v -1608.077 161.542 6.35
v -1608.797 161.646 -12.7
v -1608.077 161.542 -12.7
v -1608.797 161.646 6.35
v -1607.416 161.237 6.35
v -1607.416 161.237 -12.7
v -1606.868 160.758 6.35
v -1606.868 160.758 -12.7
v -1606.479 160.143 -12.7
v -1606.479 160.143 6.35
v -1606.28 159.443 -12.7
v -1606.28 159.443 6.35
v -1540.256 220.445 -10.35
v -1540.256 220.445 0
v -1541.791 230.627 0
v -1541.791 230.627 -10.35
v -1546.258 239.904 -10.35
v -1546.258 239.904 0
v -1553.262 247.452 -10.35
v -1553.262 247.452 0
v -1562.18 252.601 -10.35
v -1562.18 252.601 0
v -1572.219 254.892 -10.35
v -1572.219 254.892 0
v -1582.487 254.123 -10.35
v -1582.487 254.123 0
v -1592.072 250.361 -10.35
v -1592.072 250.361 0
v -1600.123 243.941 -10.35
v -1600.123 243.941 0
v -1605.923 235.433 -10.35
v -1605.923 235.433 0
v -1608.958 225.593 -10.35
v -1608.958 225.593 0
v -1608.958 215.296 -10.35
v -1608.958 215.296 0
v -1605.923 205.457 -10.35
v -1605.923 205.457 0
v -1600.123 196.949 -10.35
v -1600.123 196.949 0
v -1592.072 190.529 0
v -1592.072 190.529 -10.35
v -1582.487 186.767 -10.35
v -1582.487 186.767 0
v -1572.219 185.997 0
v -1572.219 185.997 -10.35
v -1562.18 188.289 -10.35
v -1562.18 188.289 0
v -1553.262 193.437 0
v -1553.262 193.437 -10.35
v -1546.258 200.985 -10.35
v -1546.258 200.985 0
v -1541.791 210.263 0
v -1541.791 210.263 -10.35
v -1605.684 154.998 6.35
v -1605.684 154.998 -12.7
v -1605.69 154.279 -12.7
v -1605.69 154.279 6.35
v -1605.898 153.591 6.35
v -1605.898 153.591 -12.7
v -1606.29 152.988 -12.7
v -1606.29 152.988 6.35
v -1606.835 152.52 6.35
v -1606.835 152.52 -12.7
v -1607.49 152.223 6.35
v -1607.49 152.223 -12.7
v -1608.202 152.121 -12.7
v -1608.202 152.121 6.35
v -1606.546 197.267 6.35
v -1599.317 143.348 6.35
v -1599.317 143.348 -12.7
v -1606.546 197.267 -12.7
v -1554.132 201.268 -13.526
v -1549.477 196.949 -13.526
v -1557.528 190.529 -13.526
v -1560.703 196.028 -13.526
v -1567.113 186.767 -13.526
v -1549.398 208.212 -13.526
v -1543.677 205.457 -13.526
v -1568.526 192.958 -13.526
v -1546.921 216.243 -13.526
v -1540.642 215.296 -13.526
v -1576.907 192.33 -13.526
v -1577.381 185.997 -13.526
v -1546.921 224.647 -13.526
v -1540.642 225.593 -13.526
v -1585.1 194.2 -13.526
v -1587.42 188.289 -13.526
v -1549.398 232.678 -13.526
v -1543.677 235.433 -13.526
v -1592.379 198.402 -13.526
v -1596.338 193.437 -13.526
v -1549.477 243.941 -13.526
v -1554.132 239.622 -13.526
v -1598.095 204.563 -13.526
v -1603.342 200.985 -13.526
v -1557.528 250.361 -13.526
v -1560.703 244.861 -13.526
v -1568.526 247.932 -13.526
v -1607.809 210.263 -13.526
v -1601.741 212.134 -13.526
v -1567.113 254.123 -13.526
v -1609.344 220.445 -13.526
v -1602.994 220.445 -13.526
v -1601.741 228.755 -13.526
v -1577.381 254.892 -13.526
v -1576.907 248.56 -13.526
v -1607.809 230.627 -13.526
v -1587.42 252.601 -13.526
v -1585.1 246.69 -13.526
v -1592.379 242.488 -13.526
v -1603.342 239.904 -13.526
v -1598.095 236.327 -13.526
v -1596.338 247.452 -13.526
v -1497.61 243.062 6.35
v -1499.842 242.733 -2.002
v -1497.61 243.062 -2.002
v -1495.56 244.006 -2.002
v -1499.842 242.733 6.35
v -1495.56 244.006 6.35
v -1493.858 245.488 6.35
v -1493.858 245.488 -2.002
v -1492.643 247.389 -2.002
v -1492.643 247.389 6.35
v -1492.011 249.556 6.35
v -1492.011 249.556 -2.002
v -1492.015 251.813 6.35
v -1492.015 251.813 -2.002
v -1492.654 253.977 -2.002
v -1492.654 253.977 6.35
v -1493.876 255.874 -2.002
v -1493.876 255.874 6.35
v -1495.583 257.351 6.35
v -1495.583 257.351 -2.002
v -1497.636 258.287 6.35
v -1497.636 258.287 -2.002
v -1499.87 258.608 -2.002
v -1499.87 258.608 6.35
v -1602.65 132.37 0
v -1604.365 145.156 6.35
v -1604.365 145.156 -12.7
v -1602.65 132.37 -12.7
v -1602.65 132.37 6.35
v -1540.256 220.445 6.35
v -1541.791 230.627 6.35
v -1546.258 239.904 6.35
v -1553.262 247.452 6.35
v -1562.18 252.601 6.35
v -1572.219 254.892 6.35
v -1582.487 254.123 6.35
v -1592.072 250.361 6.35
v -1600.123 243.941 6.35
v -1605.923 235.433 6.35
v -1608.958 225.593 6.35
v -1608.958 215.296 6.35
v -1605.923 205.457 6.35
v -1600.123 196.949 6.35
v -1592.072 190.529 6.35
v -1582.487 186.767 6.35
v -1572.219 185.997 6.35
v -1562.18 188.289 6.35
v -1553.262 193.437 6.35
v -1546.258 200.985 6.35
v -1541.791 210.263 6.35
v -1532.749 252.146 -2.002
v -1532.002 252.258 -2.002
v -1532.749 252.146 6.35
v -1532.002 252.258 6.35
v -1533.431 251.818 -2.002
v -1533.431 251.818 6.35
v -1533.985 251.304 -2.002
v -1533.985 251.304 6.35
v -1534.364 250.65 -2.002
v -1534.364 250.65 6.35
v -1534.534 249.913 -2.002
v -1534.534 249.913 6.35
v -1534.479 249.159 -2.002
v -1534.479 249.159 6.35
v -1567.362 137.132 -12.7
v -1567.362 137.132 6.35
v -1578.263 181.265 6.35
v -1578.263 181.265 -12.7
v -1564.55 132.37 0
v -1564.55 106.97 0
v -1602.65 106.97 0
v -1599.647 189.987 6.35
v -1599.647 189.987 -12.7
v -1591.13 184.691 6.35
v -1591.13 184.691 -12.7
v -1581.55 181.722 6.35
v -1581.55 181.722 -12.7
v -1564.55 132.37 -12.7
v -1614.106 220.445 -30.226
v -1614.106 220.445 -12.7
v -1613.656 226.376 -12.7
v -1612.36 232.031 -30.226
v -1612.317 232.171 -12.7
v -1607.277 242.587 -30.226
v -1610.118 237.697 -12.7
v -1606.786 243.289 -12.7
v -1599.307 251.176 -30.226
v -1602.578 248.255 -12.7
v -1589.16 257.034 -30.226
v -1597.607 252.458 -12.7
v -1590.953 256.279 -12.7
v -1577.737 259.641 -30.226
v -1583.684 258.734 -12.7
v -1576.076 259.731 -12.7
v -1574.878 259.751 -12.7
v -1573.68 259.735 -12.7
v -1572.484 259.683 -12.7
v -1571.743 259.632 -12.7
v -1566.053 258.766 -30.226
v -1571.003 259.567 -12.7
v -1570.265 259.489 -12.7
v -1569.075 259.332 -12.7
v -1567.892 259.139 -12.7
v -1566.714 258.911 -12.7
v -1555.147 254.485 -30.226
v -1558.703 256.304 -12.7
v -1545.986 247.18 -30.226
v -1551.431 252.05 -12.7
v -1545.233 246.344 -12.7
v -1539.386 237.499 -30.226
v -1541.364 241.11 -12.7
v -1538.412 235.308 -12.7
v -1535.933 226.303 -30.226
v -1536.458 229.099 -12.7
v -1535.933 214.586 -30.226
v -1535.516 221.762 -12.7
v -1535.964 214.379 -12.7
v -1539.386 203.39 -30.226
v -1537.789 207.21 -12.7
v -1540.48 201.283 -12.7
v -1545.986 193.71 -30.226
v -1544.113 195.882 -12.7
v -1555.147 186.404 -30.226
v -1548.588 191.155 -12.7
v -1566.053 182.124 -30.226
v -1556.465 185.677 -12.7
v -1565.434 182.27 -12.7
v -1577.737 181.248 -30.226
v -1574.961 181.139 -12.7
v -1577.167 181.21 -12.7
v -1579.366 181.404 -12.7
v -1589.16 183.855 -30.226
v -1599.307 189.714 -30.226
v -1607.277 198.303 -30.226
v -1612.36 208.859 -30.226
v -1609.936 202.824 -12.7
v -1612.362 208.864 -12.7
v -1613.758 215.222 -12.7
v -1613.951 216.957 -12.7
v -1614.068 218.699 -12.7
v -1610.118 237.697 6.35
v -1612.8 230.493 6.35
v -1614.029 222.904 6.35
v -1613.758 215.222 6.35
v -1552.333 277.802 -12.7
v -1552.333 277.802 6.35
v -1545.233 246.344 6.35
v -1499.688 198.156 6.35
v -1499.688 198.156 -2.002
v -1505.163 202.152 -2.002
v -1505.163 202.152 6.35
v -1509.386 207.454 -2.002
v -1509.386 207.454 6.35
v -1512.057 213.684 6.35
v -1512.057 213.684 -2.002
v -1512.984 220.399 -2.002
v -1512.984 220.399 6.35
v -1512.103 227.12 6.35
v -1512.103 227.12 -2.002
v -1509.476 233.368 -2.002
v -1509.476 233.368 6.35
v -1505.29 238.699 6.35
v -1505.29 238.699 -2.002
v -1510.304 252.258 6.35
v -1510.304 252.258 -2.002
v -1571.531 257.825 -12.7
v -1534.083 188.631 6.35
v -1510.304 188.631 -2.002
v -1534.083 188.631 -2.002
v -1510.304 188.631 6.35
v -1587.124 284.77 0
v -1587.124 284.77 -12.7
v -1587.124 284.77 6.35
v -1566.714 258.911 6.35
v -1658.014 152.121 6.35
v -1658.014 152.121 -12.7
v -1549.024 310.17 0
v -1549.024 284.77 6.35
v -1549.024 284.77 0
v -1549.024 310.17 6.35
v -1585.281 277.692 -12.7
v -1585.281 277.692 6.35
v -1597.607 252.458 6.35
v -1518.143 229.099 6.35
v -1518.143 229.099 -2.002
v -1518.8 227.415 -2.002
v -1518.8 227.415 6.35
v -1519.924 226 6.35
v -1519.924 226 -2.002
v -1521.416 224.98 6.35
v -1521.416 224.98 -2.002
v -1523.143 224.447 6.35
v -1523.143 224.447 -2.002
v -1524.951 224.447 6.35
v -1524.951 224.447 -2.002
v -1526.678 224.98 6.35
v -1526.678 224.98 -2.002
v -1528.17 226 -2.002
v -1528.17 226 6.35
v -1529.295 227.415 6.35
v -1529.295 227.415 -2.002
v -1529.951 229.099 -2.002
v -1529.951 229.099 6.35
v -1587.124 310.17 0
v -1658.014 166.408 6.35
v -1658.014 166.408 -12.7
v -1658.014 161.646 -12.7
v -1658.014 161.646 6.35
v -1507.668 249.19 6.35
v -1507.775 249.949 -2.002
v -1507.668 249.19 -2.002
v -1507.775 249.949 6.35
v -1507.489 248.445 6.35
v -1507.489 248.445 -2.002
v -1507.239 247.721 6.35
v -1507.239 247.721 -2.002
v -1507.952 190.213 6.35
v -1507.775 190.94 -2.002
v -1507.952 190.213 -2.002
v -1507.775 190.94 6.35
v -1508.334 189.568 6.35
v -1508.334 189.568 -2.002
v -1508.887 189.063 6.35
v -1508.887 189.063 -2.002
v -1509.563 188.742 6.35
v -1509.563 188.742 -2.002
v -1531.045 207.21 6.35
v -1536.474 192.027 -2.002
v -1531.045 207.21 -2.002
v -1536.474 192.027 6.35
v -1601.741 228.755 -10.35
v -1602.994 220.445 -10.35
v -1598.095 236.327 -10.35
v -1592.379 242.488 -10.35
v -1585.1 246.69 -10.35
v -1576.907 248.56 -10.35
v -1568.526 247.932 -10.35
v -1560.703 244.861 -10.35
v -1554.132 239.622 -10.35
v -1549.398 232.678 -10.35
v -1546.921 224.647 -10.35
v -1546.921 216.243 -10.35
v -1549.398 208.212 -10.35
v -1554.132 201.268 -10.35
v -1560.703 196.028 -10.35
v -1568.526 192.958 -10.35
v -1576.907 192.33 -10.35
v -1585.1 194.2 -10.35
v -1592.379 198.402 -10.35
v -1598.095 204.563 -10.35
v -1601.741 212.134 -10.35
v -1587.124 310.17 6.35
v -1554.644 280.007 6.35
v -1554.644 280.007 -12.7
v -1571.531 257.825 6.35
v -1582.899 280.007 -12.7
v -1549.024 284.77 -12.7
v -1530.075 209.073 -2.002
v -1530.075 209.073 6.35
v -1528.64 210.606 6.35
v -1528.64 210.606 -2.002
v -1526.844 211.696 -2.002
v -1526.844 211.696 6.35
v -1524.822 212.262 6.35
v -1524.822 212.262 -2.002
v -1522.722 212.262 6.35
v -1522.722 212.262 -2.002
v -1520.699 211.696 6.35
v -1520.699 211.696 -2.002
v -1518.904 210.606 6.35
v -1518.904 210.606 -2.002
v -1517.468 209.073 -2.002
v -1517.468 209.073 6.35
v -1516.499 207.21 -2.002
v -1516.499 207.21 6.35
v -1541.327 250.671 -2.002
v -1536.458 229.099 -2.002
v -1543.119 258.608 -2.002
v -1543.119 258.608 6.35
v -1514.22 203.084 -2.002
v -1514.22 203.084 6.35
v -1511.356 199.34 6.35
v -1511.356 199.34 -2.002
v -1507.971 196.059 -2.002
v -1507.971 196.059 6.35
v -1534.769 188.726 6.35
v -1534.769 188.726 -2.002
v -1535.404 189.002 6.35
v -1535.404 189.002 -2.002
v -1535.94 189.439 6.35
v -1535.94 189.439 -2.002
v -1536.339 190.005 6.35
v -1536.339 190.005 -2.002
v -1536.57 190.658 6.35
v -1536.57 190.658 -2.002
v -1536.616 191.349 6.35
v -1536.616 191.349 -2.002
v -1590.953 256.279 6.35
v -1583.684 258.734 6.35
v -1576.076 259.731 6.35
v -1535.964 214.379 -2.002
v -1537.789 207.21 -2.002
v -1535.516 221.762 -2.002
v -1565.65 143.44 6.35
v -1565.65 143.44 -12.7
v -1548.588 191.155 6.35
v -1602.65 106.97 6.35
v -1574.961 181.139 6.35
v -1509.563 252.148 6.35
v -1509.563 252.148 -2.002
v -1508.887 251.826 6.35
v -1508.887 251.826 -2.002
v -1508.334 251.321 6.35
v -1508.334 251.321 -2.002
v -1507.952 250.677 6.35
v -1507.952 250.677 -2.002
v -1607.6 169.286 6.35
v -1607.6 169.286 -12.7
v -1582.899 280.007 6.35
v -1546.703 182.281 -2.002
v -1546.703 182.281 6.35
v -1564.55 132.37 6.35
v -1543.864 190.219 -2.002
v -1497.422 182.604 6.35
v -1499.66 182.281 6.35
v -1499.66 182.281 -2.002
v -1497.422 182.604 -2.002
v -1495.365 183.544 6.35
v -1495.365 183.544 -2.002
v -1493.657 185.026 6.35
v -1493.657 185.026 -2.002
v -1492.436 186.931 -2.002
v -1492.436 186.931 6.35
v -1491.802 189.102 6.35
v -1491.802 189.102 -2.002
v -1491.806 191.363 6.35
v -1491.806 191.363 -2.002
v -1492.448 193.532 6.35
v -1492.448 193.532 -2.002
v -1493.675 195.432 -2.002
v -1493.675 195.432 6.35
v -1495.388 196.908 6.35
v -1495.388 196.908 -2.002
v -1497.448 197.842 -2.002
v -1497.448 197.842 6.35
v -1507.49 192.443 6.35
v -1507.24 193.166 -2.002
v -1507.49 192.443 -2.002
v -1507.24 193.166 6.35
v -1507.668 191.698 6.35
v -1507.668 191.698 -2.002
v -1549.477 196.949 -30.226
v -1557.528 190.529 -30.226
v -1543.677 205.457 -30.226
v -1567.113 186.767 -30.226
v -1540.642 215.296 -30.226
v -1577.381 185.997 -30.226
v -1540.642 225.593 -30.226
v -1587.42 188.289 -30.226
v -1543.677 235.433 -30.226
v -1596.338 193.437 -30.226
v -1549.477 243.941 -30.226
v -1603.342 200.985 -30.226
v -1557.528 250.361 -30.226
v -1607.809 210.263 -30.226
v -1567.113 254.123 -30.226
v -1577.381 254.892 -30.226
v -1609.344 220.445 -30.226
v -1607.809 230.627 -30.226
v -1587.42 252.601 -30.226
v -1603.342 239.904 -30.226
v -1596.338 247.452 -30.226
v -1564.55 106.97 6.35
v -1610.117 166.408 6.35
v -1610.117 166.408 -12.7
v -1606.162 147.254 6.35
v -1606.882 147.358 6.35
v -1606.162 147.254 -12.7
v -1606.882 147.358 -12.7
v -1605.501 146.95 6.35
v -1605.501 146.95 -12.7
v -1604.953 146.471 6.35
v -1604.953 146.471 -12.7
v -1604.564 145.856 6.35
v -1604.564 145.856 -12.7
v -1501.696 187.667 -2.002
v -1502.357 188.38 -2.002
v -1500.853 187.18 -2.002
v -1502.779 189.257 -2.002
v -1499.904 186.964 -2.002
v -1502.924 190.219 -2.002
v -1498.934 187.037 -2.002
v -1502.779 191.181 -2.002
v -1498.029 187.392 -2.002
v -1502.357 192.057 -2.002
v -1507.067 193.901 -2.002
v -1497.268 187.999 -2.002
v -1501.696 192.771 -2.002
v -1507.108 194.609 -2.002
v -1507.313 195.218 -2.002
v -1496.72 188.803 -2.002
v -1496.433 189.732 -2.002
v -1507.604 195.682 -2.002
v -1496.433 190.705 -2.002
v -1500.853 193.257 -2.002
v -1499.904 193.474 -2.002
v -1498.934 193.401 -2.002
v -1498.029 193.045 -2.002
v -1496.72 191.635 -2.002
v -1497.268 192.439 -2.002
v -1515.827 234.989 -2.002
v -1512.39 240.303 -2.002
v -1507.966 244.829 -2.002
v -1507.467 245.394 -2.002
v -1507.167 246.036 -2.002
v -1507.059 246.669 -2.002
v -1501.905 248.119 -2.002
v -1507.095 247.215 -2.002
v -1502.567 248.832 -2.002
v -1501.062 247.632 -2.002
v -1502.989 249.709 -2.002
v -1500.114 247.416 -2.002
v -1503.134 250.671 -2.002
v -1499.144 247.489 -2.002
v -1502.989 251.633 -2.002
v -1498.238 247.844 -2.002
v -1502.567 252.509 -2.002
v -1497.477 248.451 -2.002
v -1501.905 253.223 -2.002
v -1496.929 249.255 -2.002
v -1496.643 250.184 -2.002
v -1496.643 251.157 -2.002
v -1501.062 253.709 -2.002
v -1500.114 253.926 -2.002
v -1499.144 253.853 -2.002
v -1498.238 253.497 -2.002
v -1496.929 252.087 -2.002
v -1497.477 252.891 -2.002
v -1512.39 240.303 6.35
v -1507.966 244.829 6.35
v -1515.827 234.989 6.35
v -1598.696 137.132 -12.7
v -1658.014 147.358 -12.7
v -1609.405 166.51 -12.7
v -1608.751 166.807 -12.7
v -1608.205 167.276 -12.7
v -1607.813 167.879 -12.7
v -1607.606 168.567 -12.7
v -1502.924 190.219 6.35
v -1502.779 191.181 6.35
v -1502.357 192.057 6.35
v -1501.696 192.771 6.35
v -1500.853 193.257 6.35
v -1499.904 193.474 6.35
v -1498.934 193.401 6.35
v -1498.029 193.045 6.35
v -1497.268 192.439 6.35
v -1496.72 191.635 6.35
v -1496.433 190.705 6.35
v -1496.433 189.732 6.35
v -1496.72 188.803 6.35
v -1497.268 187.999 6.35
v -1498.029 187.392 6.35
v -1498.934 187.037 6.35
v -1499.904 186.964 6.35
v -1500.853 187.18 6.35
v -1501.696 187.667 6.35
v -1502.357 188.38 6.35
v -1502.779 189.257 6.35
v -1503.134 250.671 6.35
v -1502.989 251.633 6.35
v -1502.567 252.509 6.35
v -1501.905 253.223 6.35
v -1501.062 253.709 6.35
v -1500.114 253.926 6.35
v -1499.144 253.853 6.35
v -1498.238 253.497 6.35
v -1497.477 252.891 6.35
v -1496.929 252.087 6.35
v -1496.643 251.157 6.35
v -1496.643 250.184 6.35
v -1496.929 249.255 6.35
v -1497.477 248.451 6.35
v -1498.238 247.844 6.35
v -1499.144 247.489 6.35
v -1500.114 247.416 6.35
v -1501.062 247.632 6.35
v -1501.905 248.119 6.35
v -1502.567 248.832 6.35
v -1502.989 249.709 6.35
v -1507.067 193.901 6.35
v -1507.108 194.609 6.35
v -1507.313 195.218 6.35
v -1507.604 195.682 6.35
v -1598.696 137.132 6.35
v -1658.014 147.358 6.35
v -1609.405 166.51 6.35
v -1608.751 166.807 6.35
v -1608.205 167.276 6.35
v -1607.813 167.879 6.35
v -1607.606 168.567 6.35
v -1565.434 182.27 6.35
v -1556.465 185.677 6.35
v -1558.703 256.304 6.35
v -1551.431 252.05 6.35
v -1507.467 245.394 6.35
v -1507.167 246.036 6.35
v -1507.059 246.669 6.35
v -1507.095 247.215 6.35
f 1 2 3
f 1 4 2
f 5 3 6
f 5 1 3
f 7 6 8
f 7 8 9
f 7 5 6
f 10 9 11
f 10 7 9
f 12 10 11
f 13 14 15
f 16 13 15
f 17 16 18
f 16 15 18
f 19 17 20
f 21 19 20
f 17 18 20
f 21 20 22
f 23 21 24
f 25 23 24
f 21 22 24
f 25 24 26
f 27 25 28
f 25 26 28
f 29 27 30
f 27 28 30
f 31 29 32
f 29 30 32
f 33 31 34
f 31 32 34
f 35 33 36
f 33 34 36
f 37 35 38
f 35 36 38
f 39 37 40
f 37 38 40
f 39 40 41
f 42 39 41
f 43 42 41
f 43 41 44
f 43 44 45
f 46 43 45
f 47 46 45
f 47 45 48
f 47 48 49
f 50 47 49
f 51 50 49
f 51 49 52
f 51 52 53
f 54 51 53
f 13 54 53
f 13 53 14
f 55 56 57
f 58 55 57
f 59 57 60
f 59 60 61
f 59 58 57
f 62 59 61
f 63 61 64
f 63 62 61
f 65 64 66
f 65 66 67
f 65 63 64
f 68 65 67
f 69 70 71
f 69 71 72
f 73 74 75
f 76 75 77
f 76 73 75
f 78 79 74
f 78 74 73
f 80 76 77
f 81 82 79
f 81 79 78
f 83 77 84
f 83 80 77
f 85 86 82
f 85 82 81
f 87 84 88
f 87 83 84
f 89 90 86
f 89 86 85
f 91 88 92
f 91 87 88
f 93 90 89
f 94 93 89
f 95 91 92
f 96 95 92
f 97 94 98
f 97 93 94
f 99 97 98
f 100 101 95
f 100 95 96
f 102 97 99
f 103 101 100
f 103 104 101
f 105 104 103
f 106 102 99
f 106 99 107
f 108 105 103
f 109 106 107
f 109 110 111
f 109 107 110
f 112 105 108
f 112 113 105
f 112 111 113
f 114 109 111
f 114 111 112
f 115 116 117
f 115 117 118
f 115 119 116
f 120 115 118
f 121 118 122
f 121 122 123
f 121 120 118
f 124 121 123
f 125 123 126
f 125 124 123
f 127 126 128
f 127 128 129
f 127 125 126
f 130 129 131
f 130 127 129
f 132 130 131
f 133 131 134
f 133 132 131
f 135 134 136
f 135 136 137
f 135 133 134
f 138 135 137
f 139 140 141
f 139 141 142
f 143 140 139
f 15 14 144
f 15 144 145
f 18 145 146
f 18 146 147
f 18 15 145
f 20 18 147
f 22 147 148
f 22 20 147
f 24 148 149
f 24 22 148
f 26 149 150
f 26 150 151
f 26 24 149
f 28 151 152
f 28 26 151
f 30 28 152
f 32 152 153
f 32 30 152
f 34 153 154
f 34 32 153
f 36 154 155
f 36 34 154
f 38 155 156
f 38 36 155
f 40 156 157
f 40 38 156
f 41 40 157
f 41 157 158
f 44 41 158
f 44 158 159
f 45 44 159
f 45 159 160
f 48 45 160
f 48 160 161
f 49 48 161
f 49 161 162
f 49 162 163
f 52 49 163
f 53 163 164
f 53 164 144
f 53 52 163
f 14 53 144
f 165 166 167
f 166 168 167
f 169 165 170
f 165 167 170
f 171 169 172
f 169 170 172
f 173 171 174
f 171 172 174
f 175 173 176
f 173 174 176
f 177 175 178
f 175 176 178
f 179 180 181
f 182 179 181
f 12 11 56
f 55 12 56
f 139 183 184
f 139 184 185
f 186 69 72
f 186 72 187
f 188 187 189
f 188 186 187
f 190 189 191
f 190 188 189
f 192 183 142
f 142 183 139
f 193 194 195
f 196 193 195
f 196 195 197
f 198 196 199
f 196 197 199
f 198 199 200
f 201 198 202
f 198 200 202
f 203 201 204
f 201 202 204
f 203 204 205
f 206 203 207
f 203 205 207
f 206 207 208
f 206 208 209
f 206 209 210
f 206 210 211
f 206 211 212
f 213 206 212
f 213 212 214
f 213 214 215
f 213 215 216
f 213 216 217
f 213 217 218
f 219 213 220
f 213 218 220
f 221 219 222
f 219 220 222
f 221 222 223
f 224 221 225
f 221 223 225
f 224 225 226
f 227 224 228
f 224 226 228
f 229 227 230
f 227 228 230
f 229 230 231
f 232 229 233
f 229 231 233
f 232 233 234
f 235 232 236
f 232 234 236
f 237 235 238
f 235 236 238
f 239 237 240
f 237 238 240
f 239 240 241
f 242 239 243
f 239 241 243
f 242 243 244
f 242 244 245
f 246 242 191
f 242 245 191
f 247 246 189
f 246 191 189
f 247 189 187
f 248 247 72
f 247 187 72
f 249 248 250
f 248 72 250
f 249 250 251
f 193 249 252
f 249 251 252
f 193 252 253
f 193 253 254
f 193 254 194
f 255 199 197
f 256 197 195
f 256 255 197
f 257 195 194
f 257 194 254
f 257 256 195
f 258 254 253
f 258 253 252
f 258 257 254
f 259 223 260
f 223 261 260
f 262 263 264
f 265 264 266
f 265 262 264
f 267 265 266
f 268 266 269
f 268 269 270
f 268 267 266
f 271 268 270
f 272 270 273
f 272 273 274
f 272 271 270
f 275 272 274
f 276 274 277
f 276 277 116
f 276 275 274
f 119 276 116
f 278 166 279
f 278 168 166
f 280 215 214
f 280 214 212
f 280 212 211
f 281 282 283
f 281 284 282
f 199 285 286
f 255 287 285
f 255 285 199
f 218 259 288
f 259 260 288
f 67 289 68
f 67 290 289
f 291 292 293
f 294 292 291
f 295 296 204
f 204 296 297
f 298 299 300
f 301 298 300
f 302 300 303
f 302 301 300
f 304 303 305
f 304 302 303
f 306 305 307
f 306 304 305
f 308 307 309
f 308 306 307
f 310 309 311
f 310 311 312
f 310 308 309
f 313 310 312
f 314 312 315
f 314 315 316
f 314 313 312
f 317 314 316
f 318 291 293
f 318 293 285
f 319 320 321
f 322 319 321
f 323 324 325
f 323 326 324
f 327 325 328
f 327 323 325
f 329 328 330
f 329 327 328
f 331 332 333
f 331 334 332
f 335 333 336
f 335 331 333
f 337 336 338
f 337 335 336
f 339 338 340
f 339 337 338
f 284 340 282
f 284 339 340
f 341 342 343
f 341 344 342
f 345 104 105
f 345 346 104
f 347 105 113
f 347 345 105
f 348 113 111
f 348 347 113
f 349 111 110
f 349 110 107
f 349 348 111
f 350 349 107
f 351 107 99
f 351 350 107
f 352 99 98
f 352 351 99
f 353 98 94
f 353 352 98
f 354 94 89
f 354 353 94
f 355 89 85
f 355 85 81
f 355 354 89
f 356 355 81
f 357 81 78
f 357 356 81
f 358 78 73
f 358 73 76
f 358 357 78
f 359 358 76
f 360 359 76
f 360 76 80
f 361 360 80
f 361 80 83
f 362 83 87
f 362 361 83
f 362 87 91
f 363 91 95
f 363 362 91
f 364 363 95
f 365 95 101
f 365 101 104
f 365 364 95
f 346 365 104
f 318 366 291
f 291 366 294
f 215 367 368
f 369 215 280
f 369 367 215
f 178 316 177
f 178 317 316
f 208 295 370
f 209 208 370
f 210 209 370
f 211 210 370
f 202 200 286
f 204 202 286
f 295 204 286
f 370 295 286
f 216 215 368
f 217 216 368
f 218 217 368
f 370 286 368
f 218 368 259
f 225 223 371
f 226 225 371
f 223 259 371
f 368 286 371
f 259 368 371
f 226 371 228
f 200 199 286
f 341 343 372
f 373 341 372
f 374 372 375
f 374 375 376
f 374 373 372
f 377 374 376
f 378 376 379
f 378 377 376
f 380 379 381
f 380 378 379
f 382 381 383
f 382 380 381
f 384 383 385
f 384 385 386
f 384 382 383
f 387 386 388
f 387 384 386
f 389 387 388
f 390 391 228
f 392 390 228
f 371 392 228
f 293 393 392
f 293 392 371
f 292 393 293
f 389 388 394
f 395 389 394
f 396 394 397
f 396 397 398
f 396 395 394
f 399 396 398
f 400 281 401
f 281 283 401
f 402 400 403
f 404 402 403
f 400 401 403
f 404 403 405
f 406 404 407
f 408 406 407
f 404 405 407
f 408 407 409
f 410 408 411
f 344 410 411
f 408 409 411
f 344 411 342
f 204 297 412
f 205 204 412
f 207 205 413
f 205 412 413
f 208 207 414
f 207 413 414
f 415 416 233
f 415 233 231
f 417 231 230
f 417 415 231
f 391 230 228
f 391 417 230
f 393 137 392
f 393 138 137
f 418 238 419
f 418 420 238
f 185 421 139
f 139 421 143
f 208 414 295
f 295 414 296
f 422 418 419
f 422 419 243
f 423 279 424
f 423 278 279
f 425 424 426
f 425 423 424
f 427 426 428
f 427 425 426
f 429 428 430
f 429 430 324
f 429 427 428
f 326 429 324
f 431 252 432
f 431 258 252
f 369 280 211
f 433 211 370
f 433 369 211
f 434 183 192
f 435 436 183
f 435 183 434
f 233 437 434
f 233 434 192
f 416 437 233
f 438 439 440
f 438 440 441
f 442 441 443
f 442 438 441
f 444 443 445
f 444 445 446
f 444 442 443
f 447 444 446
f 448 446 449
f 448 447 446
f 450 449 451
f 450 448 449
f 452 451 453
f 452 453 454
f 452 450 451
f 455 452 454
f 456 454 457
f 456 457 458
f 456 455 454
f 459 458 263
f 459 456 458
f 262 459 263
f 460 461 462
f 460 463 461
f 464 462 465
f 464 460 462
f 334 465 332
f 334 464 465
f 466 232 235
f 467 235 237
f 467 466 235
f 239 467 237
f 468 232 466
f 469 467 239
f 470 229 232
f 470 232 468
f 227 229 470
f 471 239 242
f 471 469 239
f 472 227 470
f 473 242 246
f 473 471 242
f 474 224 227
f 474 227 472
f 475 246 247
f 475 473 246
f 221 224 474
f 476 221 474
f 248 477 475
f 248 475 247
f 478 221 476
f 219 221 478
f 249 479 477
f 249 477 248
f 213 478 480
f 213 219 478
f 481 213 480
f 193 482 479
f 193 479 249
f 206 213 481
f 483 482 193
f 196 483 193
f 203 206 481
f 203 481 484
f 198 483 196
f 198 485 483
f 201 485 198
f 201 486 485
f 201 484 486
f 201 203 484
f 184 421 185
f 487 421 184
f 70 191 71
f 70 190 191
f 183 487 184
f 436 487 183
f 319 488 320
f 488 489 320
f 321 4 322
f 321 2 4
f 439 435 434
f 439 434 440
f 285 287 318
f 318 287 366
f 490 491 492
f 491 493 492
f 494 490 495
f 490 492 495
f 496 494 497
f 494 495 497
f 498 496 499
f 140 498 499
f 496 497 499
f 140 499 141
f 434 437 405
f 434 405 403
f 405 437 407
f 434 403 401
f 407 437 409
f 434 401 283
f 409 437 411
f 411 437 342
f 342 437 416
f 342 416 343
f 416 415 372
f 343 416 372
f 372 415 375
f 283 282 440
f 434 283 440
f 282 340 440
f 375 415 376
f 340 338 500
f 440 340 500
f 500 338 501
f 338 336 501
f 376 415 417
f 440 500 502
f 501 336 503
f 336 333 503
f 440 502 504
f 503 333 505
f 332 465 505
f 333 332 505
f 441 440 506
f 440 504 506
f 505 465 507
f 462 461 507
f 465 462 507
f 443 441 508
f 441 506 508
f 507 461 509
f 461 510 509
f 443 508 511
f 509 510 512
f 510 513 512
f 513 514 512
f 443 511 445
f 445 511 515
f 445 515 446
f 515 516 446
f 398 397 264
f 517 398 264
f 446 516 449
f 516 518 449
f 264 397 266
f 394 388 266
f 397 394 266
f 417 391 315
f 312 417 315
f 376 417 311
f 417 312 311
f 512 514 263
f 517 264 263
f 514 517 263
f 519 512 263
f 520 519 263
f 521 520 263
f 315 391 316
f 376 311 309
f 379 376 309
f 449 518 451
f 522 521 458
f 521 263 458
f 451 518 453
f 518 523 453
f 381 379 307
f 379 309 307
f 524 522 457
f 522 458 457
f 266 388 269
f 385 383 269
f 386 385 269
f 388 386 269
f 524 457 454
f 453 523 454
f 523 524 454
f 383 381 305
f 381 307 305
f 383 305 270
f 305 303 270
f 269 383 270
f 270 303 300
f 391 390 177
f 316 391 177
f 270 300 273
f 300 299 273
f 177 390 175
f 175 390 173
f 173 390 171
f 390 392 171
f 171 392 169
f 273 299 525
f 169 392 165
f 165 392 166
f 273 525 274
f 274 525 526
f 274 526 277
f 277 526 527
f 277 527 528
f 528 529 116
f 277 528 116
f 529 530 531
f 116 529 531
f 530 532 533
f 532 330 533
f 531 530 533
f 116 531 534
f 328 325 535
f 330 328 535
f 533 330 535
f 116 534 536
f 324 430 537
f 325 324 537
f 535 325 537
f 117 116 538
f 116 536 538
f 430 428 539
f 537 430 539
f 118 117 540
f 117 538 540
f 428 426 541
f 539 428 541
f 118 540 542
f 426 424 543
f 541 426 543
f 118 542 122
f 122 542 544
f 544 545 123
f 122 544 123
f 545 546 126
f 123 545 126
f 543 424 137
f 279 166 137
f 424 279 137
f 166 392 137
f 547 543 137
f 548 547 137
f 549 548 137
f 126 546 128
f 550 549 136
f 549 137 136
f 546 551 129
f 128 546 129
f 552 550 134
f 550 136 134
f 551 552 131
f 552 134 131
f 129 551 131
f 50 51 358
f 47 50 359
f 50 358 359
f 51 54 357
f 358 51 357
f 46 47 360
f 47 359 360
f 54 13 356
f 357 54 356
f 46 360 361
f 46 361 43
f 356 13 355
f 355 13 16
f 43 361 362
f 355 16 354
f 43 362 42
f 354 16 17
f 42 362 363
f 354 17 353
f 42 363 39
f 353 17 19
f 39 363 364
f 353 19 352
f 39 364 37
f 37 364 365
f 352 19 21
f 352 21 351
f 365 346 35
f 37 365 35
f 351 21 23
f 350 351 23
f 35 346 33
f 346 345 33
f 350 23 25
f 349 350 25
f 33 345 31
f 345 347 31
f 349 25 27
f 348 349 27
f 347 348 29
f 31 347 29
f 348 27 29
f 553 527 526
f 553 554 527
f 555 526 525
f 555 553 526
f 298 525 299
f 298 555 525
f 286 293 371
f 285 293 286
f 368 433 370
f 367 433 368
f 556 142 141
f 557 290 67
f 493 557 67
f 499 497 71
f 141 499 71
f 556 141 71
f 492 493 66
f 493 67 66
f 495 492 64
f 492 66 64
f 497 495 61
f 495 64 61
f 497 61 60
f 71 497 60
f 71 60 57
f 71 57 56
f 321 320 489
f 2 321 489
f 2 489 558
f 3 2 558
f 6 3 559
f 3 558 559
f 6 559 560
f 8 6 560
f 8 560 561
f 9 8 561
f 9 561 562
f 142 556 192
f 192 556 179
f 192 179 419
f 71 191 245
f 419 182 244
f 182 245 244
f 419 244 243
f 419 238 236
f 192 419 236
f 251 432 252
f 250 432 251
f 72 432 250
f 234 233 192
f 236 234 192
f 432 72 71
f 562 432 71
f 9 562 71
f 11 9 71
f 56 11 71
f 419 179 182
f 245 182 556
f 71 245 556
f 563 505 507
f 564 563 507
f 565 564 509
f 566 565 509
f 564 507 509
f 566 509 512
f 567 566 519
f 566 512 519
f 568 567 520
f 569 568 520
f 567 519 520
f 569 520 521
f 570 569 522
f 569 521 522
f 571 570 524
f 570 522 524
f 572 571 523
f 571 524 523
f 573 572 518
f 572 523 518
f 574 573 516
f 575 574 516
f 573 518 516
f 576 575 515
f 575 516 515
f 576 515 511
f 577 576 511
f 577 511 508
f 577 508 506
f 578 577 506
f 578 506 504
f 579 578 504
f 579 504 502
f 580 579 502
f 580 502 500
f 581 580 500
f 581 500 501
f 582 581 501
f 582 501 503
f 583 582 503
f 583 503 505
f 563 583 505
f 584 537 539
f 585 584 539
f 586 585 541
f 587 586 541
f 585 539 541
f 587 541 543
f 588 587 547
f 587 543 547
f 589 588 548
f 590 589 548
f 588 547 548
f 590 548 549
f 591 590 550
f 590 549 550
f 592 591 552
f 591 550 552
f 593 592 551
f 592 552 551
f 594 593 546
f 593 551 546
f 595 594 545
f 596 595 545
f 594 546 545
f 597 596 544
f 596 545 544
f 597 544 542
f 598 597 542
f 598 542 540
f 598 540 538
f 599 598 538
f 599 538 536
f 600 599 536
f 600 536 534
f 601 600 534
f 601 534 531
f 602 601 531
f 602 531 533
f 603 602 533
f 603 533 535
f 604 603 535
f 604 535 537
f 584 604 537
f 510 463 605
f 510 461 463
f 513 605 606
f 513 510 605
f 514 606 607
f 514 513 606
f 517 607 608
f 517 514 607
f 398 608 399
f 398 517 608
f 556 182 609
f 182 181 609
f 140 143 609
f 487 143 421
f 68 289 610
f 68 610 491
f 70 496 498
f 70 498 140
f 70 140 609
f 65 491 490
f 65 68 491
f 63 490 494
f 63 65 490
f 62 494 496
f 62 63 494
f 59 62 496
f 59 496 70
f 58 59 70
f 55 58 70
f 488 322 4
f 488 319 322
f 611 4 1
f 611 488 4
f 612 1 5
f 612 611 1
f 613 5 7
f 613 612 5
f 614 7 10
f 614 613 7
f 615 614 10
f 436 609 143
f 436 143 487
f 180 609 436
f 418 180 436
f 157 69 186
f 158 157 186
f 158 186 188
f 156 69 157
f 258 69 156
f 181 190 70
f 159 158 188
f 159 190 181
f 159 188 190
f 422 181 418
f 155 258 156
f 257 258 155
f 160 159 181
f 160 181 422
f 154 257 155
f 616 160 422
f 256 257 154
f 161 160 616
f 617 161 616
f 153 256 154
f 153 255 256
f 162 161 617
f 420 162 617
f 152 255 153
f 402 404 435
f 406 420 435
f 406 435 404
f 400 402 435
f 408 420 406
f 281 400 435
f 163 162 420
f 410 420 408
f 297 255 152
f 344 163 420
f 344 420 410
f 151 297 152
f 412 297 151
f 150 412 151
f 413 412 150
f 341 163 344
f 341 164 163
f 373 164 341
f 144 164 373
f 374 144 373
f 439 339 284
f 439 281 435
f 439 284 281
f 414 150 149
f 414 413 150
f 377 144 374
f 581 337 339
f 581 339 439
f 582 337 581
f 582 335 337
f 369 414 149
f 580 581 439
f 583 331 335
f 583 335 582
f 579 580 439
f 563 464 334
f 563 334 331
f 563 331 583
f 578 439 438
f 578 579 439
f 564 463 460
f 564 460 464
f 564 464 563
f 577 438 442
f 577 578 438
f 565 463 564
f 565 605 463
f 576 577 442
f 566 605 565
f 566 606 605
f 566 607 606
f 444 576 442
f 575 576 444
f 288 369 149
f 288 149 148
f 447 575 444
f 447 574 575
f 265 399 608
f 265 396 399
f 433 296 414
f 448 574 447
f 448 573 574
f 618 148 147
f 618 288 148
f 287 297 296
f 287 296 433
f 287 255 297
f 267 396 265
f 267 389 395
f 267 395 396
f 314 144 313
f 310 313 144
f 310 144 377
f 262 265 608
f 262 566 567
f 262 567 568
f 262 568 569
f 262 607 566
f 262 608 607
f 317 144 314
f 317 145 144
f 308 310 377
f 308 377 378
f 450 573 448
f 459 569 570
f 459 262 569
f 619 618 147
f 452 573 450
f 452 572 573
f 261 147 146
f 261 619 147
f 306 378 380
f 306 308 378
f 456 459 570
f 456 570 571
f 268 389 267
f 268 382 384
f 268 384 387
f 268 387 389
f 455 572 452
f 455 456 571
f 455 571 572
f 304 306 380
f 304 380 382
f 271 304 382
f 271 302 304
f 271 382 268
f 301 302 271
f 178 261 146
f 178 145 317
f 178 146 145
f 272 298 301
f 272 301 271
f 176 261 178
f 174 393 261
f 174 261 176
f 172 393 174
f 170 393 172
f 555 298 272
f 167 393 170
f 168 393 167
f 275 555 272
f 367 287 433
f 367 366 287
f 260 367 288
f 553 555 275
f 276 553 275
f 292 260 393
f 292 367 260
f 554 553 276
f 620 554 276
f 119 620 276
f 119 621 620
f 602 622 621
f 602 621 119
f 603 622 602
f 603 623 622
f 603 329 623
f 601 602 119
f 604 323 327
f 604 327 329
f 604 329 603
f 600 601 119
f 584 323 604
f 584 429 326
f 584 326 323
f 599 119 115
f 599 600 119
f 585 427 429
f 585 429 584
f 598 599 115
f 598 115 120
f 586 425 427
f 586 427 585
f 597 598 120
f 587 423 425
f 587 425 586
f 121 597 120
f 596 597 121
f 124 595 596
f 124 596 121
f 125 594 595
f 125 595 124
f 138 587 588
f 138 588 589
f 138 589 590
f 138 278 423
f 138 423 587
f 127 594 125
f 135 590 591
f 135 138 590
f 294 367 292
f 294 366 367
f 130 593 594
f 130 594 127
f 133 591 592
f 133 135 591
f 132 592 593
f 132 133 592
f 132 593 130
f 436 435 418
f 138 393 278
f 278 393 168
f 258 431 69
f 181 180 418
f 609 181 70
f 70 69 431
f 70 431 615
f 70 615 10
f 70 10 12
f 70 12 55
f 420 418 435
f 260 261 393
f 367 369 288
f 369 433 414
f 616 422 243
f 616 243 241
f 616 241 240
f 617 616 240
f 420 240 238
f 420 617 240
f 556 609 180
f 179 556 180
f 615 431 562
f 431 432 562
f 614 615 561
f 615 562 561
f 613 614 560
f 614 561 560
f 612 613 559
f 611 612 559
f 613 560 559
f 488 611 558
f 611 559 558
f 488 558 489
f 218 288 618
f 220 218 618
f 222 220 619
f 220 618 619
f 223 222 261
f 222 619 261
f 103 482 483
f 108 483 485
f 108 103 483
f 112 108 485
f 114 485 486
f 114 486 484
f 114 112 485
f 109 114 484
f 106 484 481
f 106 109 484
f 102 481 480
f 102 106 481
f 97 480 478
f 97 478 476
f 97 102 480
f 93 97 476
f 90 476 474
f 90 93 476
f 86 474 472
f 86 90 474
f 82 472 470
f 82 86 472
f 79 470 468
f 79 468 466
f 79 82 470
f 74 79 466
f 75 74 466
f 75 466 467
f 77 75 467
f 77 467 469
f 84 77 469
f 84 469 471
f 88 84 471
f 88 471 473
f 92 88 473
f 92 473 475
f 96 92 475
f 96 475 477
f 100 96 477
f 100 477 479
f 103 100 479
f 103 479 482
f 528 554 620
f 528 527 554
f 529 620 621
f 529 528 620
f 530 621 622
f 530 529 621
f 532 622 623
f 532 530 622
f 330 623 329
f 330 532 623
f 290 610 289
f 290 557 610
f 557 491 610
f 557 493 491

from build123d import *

# Parameters (mm, degrees)
SKETCH1_R                 = 34.544
SKETCH1_W                 = 38.1
SKETCH1_H                 = 25.4
BOSS_EXTRUDE1_DEPTH       = 6.35
BOSS_EXTRUDE1_DEPTH_BACK  = 12.7
CUT_EXTRUDE1_START        = -12.7
SKETCH2_W                 = 38.1
SKETCH2_H                 = 25.4
CUT_EXTRUDE1_DEPTH        = 12.7
SKETCH3_R                 = 39.3065
SKETCH3_R_2               = 34.544
BOSS_EXTRUDE3_DEPTH       = 17.526
SKETCH4_R                 = 34.544
SKETCH4_R_2               = 28.194
BOSS_EXTRUDE4_DEPTH       = 1.5875
BOSS_EXTRUDE10_DEPTH      = 6.35
BOSS_EXTRUDE10_DEPTH_BACK = 2.00152
F_5_16_18_TAPPED_HOLE6_D  = 6.5278
FILLET5_R                 = 2.54
FILLET6_R                 = 2.54
BOSS_EXTRUDE9_DEPTH       = 12.7
BOSS_EXTRUDE9_DEPTH_BACK  = 6.35
FILLET4_R                 = 2.54


with BuildPart() as part:
    # Sketch1 → Boss-Extrude1 (new body, two sides)
    with BuildSketch(Plane.XY) as boss_extrude1_sk:
        with BuildLine():
            Line((-1564.55033403, 132.369836169), (-1537.788605326, 207.210066144))
            ThreePointArc((-1537.788605326, 207.210066144), (-1535.565917531, 218.059885236), (-1536.458056316, 229.099042982))
            Line((-1536.458056316, 229.099042982), (-1549.023662845, 284.769836169))
            Line((-1549.023662845, 284.769836169), (-1587.123662845, 284.769836169))
            Line((-1587.123662845, 284.769836169), (-1610.117979725, 237.697060793))
            ThreePointArc((-1610.117979725, 237.697060793), (-1613.600930979, 226.72878162), (-1613.757951397, 215.221851446))
            Line((-1613.757951397, 215.221851446), (-1602.65033403, 132.369836169))
            Line((-1602.65033403, 132.369836169), (-1564.55033403, 132.369836169))
        make_face()
        with Locations((-1574.8, 220.444778325)):
            Circle(SKETCH1_R, mode=Mode.SUBTRACT)
        with BuildLine():
            Line((-1565.649571077, 143.440187232), (-1574.961325855, 181.138609391))
            ThreePointArc((-1574.961325855, 181.138609391), (-1560.844896551, 183.698948221), (-1548.587601226, 191.154658954))
            Line((-1548.587601226, 191.154658954), (-1565.649571077, 143.440187232))
        make_face(mode=Mode.SUBTRACT)
        with BuildLine():
            Line((-1599.316994088, 143.347801615), (-1606.545707049, 197.266965093))
            ThreePointArc((-1606.545707049, 197.266965093), (-1595.557832884, 187.066442294), (-1581.549876664, 181.722173721))
            Line((-1581.549876664, 181.722173721), (-1599.316994088, 143.347801615))
        make_face(mode=Mode.SUBTRACT)
        Polygon((-1582.899237332, 280.007336169), (-1554.644379273, 280.007336169), (-1571.531413288, 257.824658876), align=None, mode=Mode.SUBTRACT)
        Polygon((-1567.361913884, 137.132336169), (-1578.262893423, 181.264697727), (-1598.695927423, 137.132336169), align=None, mode=Mode.SUBTRACT)
        with BuildLine():
            Line((-1545.232831462, 246.344266484), (-1552.333167166, 277.801667254))
            Line((-1552.333167166, 277.801667254), (-1566.714355054, 258.910650056))
            ThreePointArc((-1566.714355054, 258.910650056), (-1554.952781307, 254.372478695), (-1545.232831462, 246.344266484))
        make_face(mode=Mode.SUBTRACT)
        with BuildLine():
            Line((-1576.07575514, 259.730569536), (-1585.280544841, 277.692395712))
            Line((-1585.280544841, 277.692395712), (-1597.607290416, 252.457720179))
            ThreePointArc((-1597.607290416, 252.457720179), (-1587.378626922, 257.684261229), (-1576.07575514, 259.730569536))
        make_face(mode=Mode.SUBTRACT)
        with Locations((-1568.073662845, 297.469836169)):
            Rectangle(SKETCH1_W, SKETCH1_H)
        with Locations((-1583.60033403, 119.669836169)):
            Rectangle(SKETCH1_W, SKETCH1_H)
    extrude(amount=BOSS_EXTRUDE1_DEPTH)
    extrude(boss_extrude1_sk.sketch, amount=-BOSS_EXTRUDE1_DEPTH_BACK)

    # Sketch2 → Cut-Extrude1 (cut)
    with BuildSketch(Plane(origin=(0, 0, -12.7), x_dir=(-1, 0, 0), z_dir=(0, 0, -1)).offset(CUT_EXTRUDE1_START)):
        with Locations((1568.073662845, 297.469836169)):
            Rectangle(SKETCH2_W, SKETCH2_H)
        with Locations((1583.60033403, 119.669836169)):
            Rectangle(SKETCH2_W, SKETCH2_H)
    extrude(amount=CUT_EXTRUDE1_DEPTH, mode=Mode.SUBTRACT)

    # Sketch3 → Boss-Extrude3 (add)
    with BuildSketch(Plane(origin=(0, 0, -12.7), x_dir=(-1, 0, 0), z_dir=(0, 0, -1))):
        with Locations((1574.8, 220.444778325)):
            Circle(SKETCH3_R)
        with Locations((1574.8, 220.444778325)):
            Circle(SKETCH3_R_2, mode=Mode.SUBTRACT)
    extrude(amount=BOSS_EXTRUDE3_DEPTH)

    # Sketch4 → Boss-Extrude4 (add, symmetric)
    with BuildSketch(Plane(origin=(0, 0, -11.938), x_dir=(-1, 0, 0), z_dir=(0, 0, -1))):
        with Locations((1574.8, 220.444778325)):
            Circle(SKETCH4_R)
        with Locations((1574.8, 220.444778325)):
            Circle(SKETCH4_R_2, mode=Mode.SUBTRACT)
    extrude(amount=BOSS_EXTRUDE4_DEPTH, both=True)

    # Sketch50 → Boss-Extrude10 (add, two sides)
    with BuildSketch(Plane.XY) as boss_extrude10_sk:
        with BuildLine():
            Line((-1541.32707152, 250.670778325), (-1536.458056316, 229.099042982))
            ThreePointArc((-1536.458056316, 229.099042982), (-1535.565917531, 218.059885236), (-1537.788605326, 207.210066144))
            Line((-1537.788605326, 207.210066144), (-1543.86443159, 190.218778325))
            Line((-1543.86443159, 190.218778325), (-1546.702760944, 182.281278325))
            Line((-1546.702760944, 182.281278325), (-1499.66049752, 182.281278325))
            ThreePointArc((-1499.66049752, 182.281278325), (-1491.723009436, 190.232532365), (-1499.688005558, 198.156230659))
            ThreePointArc((-1499.688005558, 198.156230659), (-1512.984254944, 220.398966531), (-1499.842491961, 242.733325991))
            ThreePointArc((-1499.842491961, 242.733325991), (-1491.932511916, 250.684532365), (-1499.87, 258.608278325))
            Line((-1499.87, 258.608278325), (-1543.118666289, 258.608278325))
            Line((-1543.118666289, 258.608278325), (-1541.32707152, 250.670778325))
        make_face()
        with BuildLine():
            Line((-1535.178710458, 252.258278325), (-1507.647129933, 252.258278325))
            ThreePointArc((-1507.647129933, 252.258278325), (-1507.638572597, 249.041917968), (-1506.354439589, 246.09301146))
            ThreePointArc((-1506.354439589, 246.09301146), (-1513.671222734, 238.58285904), (-1518.142792697, 229.099042982))
            ThreePointArc((-1518.142792697, 229.099042982), (-1524.047084498, 224.378892556), (-1529.9513763, 229.099042982))
            Line((-1529.9513763, 229.099042982), (-1535.178710458, 252.258278325))
        make_face(mode=Mode.SUBTRACT)
        with BuildLine():
            Line((-1507.647129933, 188.631278325), (-1537.68832903, 188.631278325))
            Line((-1537.68832903, 188.631278325), (-1531.044836894, 207.210066144))
            ThreePointArc((-1531.044836894, 207.210066144), (-1523.771769284, 212.333403895), (-1516.498701674, 207.210066144))
            ThreePointArc((-1516.498701674, 207.210066144), (-1512.22122179, 200.353921044), (-1506.354439589, 194.79654519))
            ThreePointArc((-1506.354439589, 194.79654519), (-1507.638572597, 191.847638682), (-1507.647129933, 188.631278325))
        make_face(mode=Mode.SUBTRACT)
    extrude(amount=BOSS_EXTRUDE10_DEPTH)
    extrude(boss_extrude10_sk.sketch, amount=-BOSS_EXTRUDE10_DEPTH_BACK)

    # 5/16-18 Tapped Hole6 (through all)
    with Locations(Plane.XY.offset(6.35)):
        with Locations((-1499.87, 250.670778325), (-1499.66049752, 190.218778325)):
            Hole(F_5_16_18_TAPPED_HOLE6_D / 2)

    # Fillet5
    fillet5_edges = [part.edges().sort_by_distance(p)[0] for p in [
        (-1506.354439589, 246.09301146, 2.17424),
        (-1507.647129933, 252.258278325, 2.17424),
        (-1506.354439589, 194.79654519, 2.17424),
        (-1507.647129933, 188.631278325, 2.17424),
    ]]
    fillet(fillet5_edges, radius=FILLET5_R)

    # Fillet6
    fillet6_edges = [part.edges().sort_by_distance(p)[0] for p in [
        (-1535.178710458, 252.258278325, 2.17424),
        (-1537.68832903, 188.631278325, 2.17424),
    ]]
    fillet(fillet6_edges, radius=FILLET6_R)

    # rod connection → Boss-Extrude9 (add, two sides)
    with BuildSketch(Plane(origin=(0, 0, 0), x_dir=(-1, 0, 0), z_dir=(0, 0, -1))) as boss_extrude9_sk:
        Polygon((1647.10033403, 161.645888869), (1606.575249921, 161.645888869), (1607.213738044, 166.408388869), (1658.013738044, 166.408388869), (1658.013738044, 161.645888869), align=None)
        Polygon((1647.10033403, 152.120888869), (1605.298273676, 152.120888869), (1604.659785553, 147.358388869), (1658.013738044, 147.358388869), (1658.013738044, 152.120888869), align=None)
    extrude(amount=BOSS_EXTRUDE9_DEPTH)
    extrude(boss_extrude9_sk.sketch, amount=-BOSS_EXTRUDE9_DEPTH_BACK)

    # Fillet4
    fillet4_edges = [part.edges().sort_by_distance(p)[0] for p in [
        (-1605.298273676, 152.120888869, -3.175),
        (-1604.659785553, 147.358388869, -3.175),
        (-1607.213738044, 166.408388869, -3.175),
        (-1606.575249921, 161.645888869, -3.175),
    ]]
    fillet(fillet4_edges, radius=FILLET4_R)


solid = part.part
